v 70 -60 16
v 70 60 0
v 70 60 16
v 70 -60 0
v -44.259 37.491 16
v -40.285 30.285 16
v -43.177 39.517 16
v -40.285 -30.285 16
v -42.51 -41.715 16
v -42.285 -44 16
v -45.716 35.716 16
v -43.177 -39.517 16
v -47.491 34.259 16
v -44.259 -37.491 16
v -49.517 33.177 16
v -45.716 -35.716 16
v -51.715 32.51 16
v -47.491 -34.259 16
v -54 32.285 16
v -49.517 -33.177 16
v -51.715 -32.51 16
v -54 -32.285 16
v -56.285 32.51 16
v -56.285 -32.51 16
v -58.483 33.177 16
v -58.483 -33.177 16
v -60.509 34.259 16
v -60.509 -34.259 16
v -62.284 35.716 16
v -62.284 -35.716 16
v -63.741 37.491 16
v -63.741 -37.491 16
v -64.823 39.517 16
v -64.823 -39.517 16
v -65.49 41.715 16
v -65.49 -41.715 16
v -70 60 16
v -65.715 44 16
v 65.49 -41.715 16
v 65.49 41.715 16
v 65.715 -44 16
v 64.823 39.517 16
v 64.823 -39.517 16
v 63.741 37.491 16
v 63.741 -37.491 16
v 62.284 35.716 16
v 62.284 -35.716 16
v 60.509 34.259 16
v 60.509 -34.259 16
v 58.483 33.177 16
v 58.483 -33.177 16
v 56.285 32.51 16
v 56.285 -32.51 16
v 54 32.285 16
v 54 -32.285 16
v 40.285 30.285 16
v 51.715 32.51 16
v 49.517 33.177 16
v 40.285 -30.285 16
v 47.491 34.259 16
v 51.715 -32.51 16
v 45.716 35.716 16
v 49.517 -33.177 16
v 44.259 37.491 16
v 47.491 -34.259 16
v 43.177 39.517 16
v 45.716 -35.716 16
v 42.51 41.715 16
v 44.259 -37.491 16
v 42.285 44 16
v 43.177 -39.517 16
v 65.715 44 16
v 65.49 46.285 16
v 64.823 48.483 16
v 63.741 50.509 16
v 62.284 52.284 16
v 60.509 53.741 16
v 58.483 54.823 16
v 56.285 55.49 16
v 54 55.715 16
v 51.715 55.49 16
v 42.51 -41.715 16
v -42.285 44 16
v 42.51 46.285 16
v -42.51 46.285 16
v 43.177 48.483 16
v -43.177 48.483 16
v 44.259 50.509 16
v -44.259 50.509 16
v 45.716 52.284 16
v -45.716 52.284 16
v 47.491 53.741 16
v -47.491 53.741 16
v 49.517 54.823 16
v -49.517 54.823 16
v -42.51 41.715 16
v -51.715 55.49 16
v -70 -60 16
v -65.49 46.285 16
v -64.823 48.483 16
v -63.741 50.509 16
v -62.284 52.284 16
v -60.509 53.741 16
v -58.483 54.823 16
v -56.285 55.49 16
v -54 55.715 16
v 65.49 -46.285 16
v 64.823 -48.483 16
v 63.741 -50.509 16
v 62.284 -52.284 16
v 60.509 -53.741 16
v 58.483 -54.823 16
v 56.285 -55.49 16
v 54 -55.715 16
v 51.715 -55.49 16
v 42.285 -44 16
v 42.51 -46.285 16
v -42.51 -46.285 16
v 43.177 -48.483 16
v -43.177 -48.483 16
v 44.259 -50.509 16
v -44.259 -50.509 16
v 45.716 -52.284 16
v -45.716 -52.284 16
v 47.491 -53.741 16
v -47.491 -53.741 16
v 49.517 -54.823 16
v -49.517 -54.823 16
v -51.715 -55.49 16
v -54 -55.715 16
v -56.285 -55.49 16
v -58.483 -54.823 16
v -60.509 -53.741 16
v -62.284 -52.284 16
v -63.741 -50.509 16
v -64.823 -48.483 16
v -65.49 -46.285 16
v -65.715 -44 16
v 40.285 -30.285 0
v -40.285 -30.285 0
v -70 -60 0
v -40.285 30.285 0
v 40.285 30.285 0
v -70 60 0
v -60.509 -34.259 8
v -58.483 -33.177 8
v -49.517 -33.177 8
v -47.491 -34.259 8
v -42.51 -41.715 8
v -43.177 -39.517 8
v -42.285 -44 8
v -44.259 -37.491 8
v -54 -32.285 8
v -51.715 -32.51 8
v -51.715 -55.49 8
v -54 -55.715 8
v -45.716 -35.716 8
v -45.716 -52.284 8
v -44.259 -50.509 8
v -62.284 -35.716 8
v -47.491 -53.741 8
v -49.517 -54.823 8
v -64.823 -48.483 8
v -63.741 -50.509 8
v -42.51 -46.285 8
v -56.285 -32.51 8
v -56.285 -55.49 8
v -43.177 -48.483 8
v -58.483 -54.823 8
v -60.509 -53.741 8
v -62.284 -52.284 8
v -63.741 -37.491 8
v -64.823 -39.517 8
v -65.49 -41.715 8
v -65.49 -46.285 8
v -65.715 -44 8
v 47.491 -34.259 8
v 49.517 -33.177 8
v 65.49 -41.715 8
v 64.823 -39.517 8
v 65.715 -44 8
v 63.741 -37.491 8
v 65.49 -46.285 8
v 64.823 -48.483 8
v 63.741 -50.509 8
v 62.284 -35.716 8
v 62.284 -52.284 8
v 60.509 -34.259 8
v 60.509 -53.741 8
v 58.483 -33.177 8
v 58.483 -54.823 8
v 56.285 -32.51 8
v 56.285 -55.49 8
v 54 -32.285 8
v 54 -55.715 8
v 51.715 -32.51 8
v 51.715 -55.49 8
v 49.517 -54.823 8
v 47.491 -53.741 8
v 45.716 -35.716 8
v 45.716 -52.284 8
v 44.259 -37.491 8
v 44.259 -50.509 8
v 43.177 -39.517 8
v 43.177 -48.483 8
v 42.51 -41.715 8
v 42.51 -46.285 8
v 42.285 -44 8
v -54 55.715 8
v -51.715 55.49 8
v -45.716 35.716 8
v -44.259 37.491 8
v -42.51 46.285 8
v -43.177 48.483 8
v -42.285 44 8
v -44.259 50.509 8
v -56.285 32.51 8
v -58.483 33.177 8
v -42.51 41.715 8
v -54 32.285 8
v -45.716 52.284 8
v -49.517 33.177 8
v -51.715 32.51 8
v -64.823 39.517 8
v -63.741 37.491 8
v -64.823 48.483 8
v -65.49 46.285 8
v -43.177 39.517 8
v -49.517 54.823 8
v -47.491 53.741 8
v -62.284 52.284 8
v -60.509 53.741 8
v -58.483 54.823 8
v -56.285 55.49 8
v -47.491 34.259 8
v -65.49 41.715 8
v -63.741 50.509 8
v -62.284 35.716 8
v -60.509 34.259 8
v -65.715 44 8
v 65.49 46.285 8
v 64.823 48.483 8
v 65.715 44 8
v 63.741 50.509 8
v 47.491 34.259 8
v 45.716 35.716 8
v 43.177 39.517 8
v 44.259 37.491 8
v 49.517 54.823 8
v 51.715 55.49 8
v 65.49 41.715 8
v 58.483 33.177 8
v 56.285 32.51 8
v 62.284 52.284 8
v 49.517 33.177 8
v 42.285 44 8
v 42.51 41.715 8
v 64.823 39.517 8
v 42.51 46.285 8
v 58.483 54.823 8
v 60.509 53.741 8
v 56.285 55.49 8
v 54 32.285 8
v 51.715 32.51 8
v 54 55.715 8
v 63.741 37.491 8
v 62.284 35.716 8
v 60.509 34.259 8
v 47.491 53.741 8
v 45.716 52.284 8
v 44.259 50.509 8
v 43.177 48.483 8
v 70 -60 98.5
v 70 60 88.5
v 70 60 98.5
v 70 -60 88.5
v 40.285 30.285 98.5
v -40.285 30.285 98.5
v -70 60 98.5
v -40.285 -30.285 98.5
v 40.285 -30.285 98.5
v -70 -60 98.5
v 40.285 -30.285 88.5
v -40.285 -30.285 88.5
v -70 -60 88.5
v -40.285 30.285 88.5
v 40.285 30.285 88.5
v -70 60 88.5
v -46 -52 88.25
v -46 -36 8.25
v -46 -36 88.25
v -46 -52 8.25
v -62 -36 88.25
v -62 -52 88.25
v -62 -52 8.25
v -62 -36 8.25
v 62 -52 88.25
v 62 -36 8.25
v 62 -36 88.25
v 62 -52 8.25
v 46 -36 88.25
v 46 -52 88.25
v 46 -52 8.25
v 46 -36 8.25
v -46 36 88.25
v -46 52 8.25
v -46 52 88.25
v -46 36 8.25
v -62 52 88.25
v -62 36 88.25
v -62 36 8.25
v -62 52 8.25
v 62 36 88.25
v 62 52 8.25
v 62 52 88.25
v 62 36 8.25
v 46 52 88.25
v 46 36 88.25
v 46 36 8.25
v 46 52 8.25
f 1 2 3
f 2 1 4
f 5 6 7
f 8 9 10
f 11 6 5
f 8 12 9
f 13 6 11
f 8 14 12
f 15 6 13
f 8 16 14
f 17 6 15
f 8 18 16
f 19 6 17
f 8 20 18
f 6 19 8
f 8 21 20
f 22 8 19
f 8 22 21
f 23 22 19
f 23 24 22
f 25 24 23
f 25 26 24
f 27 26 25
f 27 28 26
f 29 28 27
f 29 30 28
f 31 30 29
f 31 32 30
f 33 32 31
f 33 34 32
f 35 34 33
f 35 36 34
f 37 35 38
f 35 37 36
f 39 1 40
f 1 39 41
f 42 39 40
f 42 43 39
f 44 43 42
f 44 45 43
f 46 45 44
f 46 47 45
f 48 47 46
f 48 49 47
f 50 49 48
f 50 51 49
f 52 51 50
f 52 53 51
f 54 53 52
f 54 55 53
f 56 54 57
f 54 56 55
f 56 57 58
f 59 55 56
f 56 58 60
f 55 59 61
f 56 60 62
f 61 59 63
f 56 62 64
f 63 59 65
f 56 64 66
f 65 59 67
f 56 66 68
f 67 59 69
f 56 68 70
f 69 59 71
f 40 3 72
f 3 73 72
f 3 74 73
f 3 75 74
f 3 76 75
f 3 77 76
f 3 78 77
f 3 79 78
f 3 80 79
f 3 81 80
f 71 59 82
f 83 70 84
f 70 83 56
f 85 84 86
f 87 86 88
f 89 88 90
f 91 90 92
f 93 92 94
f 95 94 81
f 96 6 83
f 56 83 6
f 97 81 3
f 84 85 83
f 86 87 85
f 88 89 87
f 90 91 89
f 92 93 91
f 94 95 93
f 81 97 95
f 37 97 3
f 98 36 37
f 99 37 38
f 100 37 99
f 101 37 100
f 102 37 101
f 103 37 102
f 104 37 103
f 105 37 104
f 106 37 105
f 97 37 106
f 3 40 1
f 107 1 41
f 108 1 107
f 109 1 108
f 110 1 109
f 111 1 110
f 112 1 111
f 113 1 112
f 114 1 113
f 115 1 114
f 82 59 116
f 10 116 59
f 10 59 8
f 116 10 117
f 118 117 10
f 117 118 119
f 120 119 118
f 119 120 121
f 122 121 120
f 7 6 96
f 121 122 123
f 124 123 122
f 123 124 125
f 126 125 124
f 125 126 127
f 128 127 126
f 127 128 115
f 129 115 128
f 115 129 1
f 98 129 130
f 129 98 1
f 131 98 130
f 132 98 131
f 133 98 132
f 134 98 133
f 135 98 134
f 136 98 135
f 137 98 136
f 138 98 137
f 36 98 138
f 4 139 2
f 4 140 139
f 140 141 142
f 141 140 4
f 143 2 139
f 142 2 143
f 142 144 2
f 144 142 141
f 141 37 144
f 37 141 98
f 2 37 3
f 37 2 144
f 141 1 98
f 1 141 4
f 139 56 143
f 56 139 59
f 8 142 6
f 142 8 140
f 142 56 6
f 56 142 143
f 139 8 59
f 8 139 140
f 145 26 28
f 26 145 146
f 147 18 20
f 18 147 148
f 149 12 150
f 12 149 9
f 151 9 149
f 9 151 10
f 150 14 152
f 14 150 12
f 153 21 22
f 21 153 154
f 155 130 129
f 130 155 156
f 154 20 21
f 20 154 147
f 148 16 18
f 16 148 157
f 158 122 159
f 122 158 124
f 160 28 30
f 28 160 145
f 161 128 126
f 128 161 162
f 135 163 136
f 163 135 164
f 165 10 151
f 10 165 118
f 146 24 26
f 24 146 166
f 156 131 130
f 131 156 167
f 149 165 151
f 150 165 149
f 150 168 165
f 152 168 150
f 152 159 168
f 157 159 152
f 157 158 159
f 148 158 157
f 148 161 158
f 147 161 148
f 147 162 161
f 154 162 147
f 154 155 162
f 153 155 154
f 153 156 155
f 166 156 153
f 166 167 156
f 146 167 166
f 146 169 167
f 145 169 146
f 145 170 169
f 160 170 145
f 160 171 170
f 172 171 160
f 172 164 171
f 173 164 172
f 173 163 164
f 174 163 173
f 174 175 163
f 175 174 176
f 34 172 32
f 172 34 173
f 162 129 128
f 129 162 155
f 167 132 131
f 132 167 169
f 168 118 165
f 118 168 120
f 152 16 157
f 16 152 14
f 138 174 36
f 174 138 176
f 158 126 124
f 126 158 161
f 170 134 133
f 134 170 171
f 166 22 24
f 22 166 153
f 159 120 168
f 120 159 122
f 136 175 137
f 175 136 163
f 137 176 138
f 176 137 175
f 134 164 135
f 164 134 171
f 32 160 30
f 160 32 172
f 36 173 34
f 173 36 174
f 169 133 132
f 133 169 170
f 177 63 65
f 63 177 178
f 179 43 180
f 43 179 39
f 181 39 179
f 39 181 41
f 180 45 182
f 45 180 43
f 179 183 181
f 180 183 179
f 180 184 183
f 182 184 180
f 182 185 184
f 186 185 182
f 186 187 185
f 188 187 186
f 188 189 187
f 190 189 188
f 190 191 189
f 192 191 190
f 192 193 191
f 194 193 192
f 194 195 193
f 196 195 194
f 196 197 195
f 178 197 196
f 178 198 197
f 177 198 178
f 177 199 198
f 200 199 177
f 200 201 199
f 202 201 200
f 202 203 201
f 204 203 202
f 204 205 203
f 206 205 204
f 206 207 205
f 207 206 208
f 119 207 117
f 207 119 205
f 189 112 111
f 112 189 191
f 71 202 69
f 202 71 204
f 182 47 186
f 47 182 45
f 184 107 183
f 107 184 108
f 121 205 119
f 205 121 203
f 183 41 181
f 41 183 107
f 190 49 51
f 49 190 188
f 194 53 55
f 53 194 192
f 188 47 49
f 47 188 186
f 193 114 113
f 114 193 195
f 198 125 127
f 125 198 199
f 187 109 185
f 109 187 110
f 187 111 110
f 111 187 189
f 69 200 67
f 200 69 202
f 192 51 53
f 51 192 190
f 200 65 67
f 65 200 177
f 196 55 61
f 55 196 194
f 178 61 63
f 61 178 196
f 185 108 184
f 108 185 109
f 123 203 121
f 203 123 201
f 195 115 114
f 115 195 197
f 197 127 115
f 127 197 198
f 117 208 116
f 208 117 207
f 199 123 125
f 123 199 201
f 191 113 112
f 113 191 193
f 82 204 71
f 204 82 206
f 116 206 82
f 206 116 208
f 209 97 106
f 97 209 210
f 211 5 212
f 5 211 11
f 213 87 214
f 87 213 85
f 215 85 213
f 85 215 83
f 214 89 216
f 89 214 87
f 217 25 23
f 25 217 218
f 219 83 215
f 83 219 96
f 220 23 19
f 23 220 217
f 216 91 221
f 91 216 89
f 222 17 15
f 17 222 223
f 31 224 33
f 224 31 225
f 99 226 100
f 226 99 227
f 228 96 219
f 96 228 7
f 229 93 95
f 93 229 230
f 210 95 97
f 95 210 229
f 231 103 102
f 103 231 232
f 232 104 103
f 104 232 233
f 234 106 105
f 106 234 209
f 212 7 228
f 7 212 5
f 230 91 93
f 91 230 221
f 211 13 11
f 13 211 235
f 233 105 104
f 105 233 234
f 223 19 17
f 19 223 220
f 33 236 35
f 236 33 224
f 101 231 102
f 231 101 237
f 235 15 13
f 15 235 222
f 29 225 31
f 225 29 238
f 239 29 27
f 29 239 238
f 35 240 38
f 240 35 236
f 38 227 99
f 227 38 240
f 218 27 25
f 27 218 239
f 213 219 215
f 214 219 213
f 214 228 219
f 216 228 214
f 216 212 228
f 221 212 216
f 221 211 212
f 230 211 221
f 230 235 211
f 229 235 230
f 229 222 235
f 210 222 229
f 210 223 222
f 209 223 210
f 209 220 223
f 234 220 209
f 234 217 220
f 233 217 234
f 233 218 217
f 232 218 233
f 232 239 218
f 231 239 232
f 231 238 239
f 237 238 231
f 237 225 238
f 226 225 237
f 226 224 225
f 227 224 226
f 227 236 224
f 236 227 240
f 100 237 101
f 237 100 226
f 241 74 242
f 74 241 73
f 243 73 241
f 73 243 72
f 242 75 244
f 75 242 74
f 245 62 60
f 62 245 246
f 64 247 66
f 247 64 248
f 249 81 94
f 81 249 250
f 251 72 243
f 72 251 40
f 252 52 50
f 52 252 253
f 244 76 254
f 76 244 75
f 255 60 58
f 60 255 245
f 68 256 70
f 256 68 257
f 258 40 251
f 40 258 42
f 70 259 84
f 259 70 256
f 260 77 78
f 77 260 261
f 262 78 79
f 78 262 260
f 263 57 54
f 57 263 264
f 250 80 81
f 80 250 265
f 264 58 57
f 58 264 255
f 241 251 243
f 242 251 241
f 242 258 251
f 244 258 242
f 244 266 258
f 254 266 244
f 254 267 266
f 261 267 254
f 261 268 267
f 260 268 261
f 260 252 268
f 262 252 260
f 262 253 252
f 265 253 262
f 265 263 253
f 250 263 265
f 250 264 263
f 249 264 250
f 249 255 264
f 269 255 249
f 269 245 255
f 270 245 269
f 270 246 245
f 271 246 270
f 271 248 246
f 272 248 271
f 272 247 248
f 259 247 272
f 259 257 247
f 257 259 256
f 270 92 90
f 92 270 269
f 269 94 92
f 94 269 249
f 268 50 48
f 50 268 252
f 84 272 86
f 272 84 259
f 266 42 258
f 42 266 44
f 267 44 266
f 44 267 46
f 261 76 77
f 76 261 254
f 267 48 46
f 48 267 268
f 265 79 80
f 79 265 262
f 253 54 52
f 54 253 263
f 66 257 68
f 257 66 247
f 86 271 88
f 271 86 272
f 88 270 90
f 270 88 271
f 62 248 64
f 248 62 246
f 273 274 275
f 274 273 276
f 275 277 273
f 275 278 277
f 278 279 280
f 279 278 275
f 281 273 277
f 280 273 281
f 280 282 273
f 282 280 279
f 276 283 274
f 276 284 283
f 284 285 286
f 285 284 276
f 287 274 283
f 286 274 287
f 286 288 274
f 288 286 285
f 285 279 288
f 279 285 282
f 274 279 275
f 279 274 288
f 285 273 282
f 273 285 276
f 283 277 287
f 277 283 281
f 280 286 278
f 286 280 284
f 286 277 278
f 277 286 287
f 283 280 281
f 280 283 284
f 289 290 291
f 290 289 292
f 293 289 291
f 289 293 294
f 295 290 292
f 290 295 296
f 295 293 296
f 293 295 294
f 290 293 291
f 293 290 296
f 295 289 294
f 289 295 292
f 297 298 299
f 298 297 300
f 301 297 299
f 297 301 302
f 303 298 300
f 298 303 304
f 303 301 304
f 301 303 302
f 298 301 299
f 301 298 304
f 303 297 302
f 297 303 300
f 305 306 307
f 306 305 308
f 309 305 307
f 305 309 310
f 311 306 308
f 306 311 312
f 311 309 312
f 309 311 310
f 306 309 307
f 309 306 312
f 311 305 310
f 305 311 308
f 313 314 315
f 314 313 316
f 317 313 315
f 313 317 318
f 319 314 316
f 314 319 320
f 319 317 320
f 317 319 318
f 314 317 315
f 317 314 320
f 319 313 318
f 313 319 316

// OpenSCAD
$fn = 32;

// ------------------------------------------------------------------------
// Frame cube: base 140 x 120 mm, posts 80 mm tall
// Every part is its own module, assembly() places every instance.
// ------------------------------------------------------------------------

// --- part 1 ---
module base_frame() {
  difference() {
    translate([-70, -60, 0]) cube([140, 120, 16]);
    translate([-40.285, -30.285, -1]) cube([80.57, 60.57, 18]);
    translate([-54, -44, 8]) cylinder(h = 9, d = 23.43);
    translate([54, -44, 8]) cylinder(h = 9, d = 23.43);
    translate([-54, 44, 8]) cylinder(h = 9, d = 23.43);
    translate([54, 44, 8]) cylinder(h = 9, d = 23.43);
  }
}

// --- part 2 ---
module corner_post() {
  translate([-8, -8, 0]) cube([16, 16, 80]);
}

// --- part 3 ---
module top_frame() {
  difference() {
    translate([-70, -60, 0]) cube([140, 120, 10]);
    translate([-40.285, -30.285, -1]) cube([80.57, 60.57, 12]);
  }
}

// --- assembly ---
module assembly() {
  color([0.80, 0.24, 0.20]) translate([0, 0, 0]) rotate([0, 0, 0]) base_frame();
  color([0.20, 0.45, 0.75]) translate([-54, -44, 8.25]) rotate([0, 0, 0]) corner_post();
  color([0.25, 0.62, 0.32]) translate([54, -44, 8.25]) rotate([0, 0, 0]) corner_post();
  color([0.92, 0.70, 0.18]) translate([-54, 44, 8.25]) rotate([0, 0, 0]) corner_post();
  color([0.58, 0.35, 0.70]) translate([54, 44, 8.25]) rotate([0, 0, 0]) corner_post();
  color([0.16, 0.66, 0.66]) translate([0, 0, 88.5]) rotate([0, 0, 0]) top_frame();
}

assembly();
